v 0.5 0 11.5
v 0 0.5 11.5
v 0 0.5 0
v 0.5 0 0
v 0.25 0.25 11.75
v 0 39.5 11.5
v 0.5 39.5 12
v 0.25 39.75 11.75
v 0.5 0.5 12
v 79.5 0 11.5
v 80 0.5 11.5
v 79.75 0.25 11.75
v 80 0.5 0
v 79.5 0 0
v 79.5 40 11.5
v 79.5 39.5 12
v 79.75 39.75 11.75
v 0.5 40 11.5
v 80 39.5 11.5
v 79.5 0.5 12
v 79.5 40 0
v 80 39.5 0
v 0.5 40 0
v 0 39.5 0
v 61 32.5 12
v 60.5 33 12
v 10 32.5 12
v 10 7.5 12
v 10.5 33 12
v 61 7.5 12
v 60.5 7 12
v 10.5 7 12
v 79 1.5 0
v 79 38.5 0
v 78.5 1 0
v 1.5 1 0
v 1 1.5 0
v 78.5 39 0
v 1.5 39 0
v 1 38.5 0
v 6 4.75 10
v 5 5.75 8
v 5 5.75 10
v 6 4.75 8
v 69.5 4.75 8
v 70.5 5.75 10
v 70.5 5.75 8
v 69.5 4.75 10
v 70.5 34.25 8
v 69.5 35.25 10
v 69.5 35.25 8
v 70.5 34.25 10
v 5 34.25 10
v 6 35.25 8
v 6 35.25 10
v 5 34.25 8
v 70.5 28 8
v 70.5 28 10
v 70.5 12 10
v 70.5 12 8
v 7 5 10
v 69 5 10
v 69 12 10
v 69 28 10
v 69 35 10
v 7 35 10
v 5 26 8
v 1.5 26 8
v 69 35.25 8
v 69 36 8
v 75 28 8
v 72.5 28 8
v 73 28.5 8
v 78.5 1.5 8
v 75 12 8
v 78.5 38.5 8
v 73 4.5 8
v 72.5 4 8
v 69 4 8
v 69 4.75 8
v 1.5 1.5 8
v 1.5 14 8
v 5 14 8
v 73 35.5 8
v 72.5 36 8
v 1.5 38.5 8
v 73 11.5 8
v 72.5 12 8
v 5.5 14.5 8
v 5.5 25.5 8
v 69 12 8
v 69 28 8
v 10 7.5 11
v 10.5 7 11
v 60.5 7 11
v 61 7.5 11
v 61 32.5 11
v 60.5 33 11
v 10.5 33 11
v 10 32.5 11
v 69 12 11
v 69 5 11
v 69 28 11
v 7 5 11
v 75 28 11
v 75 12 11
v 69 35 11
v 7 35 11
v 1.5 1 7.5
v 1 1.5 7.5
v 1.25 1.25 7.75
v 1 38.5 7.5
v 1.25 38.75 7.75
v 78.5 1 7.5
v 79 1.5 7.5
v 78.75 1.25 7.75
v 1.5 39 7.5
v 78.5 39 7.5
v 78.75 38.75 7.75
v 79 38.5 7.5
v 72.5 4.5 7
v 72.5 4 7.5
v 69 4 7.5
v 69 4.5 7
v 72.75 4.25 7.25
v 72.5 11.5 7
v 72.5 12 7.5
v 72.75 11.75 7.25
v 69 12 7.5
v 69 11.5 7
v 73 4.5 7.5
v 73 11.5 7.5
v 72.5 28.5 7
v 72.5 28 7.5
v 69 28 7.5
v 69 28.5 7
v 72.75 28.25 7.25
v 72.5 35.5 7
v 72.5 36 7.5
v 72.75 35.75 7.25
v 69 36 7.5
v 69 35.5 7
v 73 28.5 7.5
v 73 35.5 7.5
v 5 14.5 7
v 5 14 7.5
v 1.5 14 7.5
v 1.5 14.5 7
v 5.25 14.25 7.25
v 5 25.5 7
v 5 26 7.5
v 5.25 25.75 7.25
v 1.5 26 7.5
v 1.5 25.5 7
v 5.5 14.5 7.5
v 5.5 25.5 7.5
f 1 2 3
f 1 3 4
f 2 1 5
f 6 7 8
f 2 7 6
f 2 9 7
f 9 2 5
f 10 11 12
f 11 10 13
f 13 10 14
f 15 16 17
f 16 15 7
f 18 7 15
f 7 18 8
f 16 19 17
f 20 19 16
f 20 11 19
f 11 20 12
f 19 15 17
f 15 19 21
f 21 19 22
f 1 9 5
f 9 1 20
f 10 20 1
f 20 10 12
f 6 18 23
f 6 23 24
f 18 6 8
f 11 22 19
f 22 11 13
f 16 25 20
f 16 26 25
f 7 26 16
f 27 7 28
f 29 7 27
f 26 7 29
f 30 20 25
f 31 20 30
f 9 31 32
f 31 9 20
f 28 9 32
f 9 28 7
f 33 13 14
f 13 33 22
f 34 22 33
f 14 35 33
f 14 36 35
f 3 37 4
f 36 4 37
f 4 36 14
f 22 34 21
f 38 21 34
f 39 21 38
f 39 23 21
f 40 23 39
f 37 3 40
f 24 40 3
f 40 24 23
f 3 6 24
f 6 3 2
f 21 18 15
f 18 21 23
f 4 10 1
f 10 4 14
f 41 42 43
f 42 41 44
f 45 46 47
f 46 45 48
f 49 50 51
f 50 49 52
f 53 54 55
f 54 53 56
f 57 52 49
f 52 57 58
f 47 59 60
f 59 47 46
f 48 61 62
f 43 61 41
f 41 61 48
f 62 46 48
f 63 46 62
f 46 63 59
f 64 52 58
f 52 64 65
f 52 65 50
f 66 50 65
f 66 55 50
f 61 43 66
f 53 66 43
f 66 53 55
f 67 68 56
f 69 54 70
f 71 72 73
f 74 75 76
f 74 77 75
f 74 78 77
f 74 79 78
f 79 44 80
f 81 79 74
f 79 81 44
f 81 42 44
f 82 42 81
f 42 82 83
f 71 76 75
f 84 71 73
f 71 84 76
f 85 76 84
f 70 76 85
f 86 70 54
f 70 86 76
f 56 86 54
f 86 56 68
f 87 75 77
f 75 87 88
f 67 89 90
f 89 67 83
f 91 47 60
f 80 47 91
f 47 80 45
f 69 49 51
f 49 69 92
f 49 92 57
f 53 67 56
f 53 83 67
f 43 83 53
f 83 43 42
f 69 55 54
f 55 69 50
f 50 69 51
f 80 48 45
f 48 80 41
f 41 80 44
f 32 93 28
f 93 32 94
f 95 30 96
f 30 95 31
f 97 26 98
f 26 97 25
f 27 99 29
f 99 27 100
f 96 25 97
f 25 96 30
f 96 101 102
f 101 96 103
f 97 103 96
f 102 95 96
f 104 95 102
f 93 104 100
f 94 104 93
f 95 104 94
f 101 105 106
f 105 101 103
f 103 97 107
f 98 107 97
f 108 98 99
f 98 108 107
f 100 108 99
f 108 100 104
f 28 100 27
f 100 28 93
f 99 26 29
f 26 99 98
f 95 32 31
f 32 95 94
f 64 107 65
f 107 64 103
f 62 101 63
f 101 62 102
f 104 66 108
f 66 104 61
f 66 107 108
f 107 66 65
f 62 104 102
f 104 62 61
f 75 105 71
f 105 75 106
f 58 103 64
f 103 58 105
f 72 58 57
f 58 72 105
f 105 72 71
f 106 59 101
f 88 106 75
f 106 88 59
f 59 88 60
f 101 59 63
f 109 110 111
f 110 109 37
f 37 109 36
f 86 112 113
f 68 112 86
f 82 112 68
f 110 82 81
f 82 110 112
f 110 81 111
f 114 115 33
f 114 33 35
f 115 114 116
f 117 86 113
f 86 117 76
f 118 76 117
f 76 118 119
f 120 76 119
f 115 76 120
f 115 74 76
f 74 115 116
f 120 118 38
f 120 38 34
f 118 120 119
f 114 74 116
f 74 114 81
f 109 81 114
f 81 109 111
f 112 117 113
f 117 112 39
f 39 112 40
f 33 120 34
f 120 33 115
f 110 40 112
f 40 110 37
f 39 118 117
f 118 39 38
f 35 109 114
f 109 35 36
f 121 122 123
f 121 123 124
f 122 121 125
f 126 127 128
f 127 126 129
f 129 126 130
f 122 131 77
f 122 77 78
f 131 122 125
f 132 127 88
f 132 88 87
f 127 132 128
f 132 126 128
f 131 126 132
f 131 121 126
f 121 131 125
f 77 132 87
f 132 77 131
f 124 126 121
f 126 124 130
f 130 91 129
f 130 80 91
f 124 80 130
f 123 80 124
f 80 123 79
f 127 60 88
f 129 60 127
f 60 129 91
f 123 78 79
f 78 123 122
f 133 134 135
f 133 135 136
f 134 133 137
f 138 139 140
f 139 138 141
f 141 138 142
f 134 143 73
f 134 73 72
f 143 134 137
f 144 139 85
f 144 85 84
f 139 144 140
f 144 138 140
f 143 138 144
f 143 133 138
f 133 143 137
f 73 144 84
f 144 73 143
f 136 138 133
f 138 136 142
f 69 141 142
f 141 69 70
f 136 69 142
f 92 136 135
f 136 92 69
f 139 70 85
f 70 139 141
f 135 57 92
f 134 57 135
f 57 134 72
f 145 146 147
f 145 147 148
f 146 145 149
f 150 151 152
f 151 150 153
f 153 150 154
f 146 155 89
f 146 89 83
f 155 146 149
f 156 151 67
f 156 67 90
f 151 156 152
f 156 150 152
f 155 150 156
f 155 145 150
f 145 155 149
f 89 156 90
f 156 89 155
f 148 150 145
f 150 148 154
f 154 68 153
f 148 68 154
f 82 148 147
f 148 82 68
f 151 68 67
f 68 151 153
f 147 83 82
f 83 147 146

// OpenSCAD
echo(version=version());

//Chamfer Library
/* https://github.com/SebiTimeWaster/Chamfers-for-OpenSCAD */
include <Chamfers-for-OpenSCAD/Chamfer.scad>;

    
/* [Customizer] */
// Increase the visual detail
$fn = 100;

module display() {
    color("red")
    translate([0,-0.25,0])
    chamferCube([65.5, 30.5, 2], [[0, 0, 0, 0], [0, 0, 0, 0], [1, 1, 1, 1]], 1);
    
    color("pink")
    translate([2,0,2])
    cube([62,30,1]);
    
    color("blue")
    translate([5,2,3])
    chamferCube([51, 26, 1], [[0, 0, 0, 0], [0, 0, 0, 0], [1, 1, 1, 1]], 0.5);
    
    color("lightblue")
    translate([62,7,0])
    cube([8,16,3]);
}

module casefront() {
    color("white")
    chamferCube([80, 40, 12], [[0, 0, 1, 1], [0, 1, 1, 0], [1, 1, 1, 1]], 0.5);
    
}

module frontcase() {
    difference() {
    casefront();

    translate([5,5,8])
    display();
    
    translate([1,1,0])
    chamferCube([78, 38, 8], [[0, 0, 1, 1], [0, 1, 1, 0], [1, 1, 1, 1]], 0.5);

    }
}  


module displayholds() {
translate([69,4,7])
color("lightgreen")
chamferCube([4, 8, 1], [[1, 1, 0, 0], [0, 0, 0, 1], [0, 1, 1, 0]], 0.5);

translate([69,28,7])
color("lightgreen")
chamferCube([4, 8, 1], [[1, 1, 0, 0], [0, 0, 0, 1], [0, 1, 1, 0]], 0.5);

translate([1.5,14,7])
color("lightgreen")
chamferCube([4, 12, 1], [[1, 1, 0, 0], [0, 0, 0, 1], [0, 1, 1, 0]], 0.5);
}
    
frontcase();    
displayholds();    

    
    
    
    
